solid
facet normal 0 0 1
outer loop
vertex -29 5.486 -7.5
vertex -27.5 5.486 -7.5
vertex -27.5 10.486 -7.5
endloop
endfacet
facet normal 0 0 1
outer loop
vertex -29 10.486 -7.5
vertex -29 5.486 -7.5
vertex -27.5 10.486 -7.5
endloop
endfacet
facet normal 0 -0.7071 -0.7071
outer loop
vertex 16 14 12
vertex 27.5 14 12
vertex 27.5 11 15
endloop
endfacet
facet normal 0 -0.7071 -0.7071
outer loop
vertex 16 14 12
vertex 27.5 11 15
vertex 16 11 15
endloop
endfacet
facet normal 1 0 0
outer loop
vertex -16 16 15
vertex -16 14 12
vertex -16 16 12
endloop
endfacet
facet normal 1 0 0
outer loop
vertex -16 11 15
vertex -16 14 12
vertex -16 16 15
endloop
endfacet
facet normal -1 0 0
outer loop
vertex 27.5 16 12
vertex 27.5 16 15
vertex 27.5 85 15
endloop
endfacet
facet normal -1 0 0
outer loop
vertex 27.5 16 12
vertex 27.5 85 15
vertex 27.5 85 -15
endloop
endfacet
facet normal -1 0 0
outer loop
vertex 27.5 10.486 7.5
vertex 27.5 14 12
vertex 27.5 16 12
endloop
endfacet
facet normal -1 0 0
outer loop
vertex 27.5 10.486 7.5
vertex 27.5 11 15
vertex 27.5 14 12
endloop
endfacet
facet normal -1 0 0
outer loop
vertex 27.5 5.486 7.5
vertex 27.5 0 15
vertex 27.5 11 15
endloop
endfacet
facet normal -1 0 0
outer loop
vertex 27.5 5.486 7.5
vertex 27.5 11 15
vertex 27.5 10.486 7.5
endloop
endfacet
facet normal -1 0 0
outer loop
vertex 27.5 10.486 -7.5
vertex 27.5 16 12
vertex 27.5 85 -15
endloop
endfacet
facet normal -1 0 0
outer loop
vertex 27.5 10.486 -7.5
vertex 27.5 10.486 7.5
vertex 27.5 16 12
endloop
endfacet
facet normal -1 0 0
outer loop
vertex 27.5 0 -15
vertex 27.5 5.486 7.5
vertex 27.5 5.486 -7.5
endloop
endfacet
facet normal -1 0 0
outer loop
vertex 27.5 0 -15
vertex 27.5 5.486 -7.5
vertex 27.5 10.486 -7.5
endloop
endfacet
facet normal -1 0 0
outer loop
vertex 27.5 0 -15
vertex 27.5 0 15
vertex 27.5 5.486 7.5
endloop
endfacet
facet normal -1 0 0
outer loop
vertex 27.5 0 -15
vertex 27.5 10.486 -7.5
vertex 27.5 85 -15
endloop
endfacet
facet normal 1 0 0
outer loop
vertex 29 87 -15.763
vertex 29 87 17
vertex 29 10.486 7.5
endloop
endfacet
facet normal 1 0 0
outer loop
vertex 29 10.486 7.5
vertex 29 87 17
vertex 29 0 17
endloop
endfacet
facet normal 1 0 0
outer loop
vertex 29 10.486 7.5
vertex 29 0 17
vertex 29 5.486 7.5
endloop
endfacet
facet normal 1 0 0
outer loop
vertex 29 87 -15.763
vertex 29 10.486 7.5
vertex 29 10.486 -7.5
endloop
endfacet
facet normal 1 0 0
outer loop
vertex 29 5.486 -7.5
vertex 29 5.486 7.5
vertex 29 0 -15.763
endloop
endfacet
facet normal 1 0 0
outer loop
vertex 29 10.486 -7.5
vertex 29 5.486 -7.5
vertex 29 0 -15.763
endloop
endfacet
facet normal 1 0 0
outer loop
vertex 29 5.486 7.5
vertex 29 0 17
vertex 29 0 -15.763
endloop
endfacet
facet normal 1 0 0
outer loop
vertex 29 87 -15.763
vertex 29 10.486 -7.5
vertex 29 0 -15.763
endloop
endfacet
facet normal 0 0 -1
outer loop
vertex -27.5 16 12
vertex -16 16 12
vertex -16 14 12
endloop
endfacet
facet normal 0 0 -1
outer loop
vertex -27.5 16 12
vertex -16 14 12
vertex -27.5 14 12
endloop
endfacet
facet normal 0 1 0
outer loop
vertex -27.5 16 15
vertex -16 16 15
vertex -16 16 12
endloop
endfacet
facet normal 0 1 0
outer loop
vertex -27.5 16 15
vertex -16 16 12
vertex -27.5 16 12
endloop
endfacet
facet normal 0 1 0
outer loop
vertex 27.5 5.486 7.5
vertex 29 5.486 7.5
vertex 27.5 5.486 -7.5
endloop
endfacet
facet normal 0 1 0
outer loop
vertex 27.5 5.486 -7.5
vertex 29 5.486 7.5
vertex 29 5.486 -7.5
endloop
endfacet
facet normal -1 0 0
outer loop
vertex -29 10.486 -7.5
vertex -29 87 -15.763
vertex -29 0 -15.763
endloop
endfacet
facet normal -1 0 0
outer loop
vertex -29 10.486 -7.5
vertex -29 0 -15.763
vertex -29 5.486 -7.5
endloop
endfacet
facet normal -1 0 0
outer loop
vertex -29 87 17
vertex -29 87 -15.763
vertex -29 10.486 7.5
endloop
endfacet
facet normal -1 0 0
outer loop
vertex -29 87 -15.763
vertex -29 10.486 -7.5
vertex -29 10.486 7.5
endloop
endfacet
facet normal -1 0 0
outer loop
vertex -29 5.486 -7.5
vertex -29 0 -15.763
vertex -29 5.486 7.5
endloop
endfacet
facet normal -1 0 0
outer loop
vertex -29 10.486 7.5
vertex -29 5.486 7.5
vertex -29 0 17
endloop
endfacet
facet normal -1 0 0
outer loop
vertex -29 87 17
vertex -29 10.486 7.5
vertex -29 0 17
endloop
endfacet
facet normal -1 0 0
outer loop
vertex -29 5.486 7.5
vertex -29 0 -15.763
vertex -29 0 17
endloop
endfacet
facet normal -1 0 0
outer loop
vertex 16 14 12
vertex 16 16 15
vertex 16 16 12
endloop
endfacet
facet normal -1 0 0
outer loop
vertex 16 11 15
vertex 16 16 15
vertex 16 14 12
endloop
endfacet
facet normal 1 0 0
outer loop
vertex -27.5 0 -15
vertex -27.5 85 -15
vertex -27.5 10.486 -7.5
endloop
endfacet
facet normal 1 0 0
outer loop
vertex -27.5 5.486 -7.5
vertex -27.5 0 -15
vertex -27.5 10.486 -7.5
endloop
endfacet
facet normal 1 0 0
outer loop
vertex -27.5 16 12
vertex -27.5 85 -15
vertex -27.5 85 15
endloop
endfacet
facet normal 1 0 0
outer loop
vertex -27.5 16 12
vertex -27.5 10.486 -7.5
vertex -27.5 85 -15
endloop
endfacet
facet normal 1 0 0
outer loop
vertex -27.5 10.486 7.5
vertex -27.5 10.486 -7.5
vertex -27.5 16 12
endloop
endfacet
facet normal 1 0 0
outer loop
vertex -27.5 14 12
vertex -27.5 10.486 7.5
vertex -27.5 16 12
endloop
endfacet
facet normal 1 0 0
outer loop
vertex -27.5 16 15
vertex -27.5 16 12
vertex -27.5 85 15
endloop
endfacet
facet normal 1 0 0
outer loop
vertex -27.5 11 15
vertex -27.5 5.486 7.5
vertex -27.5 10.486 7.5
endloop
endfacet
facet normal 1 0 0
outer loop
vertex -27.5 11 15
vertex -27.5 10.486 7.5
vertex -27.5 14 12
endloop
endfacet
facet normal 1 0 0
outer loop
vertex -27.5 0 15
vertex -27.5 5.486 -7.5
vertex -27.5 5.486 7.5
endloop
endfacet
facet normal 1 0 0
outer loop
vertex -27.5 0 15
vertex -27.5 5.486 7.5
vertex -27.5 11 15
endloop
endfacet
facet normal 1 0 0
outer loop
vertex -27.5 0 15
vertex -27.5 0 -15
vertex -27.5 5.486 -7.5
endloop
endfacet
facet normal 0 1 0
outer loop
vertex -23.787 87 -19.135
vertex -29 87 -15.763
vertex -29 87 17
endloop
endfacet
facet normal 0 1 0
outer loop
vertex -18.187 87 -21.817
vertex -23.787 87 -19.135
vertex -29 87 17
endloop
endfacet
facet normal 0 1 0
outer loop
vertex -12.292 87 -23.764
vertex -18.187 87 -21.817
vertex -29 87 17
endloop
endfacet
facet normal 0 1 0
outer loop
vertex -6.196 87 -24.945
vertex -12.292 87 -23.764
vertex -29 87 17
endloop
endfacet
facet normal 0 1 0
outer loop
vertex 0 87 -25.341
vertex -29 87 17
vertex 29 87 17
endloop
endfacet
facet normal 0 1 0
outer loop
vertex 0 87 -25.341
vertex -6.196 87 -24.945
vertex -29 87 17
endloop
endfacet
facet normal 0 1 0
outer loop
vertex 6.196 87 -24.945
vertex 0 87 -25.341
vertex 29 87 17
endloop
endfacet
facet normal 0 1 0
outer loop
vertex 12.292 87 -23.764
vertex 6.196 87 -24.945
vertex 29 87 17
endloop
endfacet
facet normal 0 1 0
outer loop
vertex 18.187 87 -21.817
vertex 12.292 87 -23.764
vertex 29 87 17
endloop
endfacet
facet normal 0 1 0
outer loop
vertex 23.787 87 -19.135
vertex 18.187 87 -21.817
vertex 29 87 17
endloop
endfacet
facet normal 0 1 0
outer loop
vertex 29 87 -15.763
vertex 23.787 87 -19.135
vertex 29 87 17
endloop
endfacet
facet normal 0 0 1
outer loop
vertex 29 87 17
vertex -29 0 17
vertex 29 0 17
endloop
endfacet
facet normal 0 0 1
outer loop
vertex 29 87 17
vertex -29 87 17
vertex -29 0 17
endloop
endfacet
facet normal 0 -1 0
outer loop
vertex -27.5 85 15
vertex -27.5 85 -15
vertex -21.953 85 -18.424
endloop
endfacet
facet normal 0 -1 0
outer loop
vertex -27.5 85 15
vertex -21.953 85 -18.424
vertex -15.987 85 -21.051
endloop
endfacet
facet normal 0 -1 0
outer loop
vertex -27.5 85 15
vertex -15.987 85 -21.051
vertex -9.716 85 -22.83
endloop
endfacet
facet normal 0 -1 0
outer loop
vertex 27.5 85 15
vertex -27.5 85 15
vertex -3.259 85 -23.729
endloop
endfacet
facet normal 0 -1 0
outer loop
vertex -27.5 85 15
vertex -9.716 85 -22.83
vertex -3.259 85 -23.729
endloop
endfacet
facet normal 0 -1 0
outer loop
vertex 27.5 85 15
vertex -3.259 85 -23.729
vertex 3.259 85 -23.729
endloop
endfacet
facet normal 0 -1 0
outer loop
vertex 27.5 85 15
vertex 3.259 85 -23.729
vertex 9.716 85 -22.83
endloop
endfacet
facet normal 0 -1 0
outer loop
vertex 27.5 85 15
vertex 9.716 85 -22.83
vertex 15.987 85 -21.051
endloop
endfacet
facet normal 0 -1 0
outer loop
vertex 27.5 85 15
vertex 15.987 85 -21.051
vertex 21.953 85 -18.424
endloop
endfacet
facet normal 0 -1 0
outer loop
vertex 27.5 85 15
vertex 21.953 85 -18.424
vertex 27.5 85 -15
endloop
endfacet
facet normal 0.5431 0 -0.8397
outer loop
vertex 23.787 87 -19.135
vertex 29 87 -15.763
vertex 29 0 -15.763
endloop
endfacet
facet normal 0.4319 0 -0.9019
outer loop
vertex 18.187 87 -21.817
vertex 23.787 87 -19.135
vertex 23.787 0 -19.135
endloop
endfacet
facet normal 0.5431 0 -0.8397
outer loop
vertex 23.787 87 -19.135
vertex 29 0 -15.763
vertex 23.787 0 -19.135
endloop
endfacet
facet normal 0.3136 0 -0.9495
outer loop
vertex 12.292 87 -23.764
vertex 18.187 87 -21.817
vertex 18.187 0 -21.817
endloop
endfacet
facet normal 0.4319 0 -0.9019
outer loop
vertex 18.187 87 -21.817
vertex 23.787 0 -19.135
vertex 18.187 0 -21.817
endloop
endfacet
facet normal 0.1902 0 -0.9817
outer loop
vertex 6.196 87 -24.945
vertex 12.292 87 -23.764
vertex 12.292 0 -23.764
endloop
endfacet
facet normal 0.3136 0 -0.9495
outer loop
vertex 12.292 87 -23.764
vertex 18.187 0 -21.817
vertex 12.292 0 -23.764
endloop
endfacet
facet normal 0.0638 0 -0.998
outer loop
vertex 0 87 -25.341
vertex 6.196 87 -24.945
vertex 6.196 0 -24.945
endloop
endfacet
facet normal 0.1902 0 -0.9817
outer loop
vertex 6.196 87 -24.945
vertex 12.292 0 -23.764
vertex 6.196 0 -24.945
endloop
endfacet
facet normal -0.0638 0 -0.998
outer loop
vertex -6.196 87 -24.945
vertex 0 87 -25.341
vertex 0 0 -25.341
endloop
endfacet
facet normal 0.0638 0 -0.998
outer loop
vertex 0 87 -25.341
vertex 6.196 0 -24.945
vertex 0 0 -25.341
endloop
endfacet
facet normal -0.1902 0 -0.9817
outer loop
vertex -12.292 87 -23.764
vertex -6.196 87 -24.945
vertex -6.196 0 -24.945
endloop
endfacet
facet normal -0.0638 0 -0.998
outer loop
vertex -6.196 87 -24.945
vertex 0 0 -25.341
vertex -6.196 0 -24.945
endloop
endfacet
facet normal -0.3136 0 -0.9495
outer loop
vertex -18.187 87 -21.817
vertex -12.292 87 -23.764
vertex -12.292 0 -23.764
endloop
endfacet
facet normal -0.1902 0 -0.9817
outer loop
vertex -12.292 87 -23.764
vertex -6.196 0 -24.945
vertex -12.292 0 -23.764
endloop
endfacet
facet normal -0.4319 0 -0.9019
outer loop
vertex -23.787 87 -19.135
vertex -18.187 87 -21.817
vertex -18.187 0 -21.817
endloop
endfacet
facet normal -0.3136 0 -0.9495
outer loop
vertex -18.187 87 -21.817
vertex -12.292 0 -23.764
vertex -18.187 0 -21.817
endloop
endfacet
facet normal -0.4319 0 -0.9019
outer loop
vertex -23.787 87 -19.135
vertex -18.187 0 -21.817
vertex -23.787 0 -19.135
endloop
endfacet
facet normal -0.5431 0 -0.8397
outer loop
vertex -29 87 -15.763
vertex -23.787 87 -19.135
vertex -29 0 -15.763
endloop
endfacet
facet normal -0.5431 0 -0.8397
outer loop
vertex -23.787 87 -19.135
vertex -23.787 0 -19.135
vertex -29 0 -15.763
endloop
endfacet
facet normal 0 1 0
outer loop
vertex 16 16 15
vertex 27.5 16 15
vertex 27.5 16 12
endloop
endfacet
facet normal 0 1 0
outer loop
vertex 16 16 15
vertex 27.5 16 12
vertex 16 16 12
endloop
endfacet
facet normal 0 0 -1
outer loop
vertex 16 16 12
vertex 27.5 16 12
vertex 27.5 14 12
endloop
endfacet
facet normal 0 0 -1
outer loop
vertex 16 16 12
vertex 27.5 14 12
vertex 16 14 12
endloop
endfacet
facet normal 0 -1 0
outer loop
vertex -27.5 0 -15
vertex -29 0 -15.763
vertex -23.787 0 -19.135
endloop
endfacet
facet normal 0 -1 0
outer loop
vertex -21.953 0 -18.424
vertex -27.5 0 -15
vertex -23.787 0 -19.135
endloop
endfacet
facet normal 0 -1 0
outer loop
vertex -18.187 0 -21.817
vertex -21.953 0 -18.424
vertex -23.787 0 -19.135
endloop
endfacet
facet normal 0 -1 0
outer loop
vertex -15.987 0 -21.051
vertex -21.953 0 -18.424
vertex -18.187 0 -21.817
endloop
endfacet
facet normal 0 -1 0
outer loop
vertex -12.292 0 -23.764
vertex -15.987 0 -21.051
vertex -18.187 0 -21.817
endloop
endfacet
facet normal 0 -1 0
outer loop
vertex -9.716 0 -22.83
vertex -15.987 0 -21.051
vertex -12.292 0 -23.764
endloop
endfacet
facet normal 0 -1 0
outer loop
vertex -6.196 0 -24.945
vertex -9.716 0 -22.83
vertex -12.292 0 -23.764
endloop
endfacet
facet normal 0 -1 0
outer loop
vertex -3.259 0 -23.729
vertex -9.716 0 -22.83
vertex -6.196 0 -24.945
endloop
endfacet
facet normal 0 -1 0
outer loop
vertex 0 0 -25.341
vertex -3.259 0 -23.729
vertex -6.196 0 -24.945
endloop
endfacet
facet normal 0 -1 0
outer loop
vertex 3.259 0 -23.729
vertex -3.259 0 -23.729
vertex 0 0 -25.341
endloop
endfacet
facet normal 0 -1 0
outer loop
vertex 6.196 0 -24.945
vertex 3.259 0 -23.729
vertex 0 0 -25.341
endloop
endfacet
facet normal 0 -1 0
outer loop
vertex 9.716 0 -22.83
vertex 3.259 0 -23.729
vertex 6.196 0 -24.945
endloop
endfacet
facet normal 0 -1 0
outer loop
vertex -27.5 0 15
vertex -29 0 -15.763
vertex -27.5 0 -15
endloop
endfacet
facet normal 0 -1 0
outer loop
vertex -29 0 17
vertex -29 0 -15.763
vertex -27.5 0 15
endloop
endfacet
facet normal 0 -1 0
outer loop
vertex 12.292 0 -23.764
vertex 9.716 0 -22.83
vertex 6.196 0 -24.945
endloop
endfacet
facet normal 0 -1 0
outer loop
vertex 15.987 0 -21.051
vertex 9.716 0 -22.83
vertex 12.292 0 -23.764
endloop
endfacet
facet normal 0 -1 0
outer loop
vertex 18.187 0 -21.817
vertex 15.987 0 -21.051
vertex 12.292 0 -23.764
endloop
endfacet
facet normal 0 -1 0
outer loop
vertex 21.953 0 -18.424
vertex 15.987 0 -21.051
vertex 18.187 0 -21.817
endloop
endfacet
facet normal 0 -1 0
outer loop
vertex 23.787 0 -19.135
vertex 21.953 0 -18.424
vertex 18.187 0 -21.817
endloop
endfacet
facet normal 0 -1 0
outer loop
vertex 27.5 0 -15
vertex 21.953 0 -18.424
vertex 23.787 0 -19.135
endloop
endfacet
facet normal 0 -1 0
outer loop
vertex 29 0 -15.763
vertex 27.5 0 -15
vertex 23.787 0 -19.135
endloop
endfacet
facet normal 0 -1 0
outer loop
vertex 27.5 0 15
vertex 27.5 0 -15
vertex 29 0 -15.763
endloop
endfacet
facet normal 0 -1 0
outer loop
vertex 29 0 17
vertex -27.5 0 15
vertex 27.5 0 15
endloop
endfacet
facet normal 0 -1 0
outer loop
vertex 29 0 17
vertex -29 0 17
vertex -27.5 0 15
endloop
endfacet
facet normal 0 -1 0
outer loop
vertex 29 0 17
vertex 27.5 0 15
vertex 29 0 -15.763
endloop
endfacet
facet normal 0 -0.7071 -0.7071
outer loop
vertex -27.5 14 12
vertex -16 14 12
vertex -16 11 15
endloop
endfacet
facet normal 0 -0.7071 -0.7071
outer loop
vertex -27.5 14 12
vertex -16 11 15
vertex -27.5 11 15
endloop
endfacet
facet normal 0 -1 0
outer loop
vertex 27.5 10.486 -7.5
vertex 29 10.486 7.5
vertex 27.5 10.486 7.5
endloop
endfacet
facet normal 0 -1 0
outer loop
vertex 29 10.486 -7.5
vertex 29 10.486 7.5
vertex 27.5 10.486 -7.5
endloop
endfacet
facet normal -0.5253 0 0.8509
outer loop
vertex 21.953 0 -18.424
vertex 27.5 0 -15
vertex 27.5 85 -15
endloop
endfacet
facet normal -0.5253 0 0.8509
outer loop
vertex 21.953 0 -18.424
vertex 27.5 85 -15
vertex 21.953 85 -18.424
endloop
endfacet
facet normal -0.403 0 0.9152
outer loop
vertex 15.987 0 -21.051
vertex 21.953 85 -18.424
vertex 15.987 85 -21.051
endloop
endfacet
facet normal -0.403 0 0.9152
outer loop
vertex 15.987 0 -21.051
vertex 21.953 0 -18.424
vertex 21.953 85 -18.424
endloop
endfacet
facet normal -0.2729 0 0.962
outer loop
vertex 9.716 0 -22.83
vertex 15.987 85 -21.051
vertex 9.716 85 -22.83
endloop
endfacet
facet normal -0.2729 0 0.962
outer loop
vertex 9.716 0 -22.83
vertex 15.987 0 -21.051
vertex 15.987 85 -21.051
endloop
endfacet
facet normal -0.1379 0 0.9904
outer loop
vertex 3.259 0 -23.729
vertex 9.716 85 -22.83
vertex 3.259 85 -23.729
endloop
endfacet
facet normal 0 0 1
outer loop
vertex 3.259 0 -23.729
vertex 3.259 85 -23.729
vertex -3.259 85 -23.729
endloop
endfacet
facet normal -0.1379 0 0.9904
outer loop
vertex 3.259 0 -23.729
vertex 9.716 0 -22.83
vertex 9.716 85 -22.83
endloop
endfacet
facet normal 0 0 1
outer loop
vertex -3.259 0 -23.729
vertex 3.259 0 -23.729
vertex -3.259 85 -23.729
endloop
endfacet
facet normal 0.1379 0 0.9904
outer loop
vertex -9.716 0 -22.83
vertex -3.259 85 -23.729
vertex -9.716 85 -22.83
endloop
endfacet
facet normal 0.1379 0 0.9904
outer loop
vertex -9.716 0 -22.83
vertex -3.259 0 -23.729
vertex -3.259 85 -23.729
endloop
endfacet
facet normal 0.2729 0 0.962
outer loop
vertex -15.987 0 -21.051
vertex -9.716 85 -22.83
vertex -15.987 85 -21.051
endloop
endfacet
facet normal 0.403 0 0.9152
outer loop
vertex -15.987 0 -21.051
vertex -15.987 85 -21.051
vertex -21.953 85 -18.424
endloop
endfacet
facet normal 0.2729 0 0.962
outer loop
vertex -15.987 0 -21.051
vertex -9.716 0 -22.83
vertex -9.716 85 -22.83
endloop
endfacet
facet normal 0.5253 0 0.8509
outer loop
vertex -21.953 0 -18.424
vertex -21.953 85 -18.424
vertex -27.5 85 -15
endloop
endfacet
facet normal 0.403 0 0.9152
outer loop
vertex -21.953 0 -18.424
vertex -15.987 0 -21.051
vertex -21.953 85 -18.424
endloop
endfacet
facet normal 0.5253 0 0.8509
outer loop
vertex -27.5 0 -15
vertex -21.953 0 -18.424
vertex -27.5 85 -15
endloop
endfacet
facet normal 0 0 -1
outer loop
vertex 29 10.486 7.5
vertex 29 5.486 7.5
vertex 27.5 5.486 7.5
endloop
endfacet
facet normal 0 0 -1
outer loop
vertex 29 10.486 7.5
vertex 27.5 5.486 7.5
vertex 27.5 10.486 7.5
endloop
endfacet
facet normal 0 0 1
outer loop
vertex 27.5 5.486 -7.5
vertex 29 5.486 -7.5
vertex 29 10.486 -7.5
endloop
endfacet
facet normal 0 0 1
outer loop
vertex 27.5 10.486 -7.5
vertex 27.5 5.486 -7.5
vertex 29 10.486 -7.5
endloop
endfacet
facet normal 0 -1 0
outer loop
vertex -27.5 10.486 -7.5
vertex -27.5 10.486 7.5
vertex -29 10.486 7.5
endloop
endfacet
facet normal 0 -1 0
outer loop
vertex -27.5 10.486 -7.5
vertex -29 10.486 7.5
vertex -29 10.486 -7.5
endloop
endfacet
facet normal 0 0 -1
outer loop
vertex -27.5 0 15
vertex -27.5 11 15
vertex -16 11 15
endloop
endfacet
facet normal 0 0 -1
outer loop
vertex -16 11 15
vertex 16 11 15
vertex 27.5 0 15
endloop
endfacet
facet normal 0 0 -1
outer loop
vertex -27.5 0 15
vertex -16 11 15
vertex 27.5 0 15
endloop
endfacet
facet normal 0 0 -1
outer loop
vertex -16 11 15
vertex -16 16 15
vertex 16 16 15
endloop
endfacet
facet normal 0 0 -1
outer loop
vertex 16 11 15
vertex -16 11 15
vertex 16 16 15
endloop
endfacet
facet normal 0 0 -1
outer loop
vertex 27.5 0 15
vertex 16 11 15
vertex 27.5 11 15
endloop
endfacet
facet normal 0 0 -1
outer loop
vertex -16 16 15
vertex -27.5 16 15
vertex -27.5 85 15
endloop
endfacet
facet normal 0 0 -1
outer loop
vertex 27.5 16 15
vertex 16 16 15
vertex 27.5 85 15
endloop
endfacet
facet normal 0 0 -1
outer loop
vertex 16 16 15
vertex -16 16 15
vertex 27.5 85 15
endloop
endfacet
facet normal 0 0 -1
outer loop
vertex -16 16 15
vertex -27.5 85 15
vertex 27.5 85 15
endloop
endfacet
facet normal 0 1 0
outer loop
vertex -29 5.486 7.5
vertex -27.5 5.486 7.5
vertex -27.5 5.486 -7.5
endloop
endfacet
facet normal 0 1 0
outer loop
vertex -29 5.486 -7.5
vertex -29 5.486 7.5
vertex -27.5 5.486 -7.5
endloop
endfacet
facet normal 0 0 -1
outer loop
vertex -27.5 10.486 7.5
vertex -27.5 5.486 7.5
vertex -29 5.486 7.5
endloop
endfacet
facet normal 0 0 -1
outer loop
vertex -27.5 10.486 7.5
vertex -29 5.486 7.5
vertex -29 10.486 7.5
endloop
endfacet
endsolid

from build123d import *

# Parameters (mm, degrees)
BOSS_EXTRUDE1_DEPTH = 85
BOSS_EXTRUDE3_DEPTH = 2
SKETCH9_W           = 11.5
SKETCH9_H           = 2
BOSS_EXTRUDE8_DEPTH = 3
CHAMFER1_SIZE       = 3
SKETCH10_W          = 32
SKETCH10_H          = 85
BOSS_EXTRUDE9_DEPTH = 2
SKETCH11_W          = 15
SKETCH11_H          = 5
CUT_EXTRUDE1_DEPTH  = 108.588010242


with BuildPart() as part:
    # Sketch1 → Boss-Extrude1 (new body)
    with BuildSketch(Plane(origin=(0, 0, 0), x_dir=(1, 0, 0), z_dir=(0, 1, 0))):
        with BuildLine():
            Line((-29, -15), (-29, 15.762564303))
            ThreePointArc((-29, 15.762564303), (0, 25.341269657), (29, 15.762564303))
            Line((29, 15.762564303), (29, -15))
            Line((29, -15), (29, -17))
            Line((29, -17), (27.5, -17))
            Line((27.5, -17), (16, -17))
            Line((16, -17), (16, -15))
            Line((16, -15), (27.5, -15))
            Line((27.5, -15), (27.5, 15))
            ThreePointArc((27.5, 15), (0, 23.841269657), (-27.5, 15))
            Line((-27.5, 15), (-27.5, -15))
            Line((-27.5, -15), (-16, -15))
            Line((-16, -15), (-16, -17))
            Line((-16, -17), (-27.5, -17))
            Line((-27.5, -17), (-29, -17))
            Line((-29, -17), (-29, -15))
        make_face()
    extrude(amount=BOSS_EXTRUDE1_DEPTH)

    # Sketch3 → Boss-Extrude3 (add)
    with BuildSketch(Plane(origin=(0, 85, 0), x_dir=(1, 0, 0), z_dir=(0, 1, 0))):
        with BuildLine():
            Line((-16, -17), (16, -17))
            Line((16, -17), (29, -17))
            Line((29, -17), (29, 15.762564303))
            ThreePointArc((29, 15.762564303), (0, 25.341269657), (-29, 15.762564303))
            Line((-29, 15.762564303), (-29, -17))
            Line((-29, -17), (-16, -17))
        make_face()
    extrude(amount=BOSS_EXTRUDE3_DEPTH)

    # Sketch9 → Boss-Extrude8 (add)
    with BuildSketch(Plane(origin=(0, 0, 15), x_dir=(-1, 0, 0), z_dir=(0, 0, -1))):
        with Locations((-21.75, 15)):
            Rectangle(SKETCH9_W, SKETCH9_H)
        with Locations((21.75, 15)):
            Rectangle(SKETCH9_W, SKETCH9_H)
    extrude(amount=BOSS_EXTRUDE8_DEPTH)

    # Chamfer1
    chamfer1_edges = [part.edges().sort_by_distance(p)[0] for p in [
        (-21.75, 14, 15),
        (21.75, 14, 15),
    ]]
    chamfer(chamfer1_edges, length=CHAMFER1_SIZE - 0.0001)  # a hair under: the kernel refuses the full size

    # Sketch10 → Boss-Extrude9 (add)
    with BuildSketch(Plane.XY.offset(17)):
        with Locations((0, 42.5)):
            Rectangle(SKETCH10_W, SKETCH10_H)
    extrude(amount=-BOSS_EXTRUDE9_DEPTH)

    # Sketch11 → Cut-Extrude1 (cut, through all)
    with BuildSketch(Plane(origin=(29, 0, 0), x_dir=(0, 0, -1), z_dir=(1, 0, 0))):
        with Locations((0, 7.985525628)):
            Rectangle(SKETCH11_W, SKETCH11_H)
    extrude(amount=-CUT_EXTRUDE1_DEPTH, mode=Mode.SUBTRACT)


solid = part.part
